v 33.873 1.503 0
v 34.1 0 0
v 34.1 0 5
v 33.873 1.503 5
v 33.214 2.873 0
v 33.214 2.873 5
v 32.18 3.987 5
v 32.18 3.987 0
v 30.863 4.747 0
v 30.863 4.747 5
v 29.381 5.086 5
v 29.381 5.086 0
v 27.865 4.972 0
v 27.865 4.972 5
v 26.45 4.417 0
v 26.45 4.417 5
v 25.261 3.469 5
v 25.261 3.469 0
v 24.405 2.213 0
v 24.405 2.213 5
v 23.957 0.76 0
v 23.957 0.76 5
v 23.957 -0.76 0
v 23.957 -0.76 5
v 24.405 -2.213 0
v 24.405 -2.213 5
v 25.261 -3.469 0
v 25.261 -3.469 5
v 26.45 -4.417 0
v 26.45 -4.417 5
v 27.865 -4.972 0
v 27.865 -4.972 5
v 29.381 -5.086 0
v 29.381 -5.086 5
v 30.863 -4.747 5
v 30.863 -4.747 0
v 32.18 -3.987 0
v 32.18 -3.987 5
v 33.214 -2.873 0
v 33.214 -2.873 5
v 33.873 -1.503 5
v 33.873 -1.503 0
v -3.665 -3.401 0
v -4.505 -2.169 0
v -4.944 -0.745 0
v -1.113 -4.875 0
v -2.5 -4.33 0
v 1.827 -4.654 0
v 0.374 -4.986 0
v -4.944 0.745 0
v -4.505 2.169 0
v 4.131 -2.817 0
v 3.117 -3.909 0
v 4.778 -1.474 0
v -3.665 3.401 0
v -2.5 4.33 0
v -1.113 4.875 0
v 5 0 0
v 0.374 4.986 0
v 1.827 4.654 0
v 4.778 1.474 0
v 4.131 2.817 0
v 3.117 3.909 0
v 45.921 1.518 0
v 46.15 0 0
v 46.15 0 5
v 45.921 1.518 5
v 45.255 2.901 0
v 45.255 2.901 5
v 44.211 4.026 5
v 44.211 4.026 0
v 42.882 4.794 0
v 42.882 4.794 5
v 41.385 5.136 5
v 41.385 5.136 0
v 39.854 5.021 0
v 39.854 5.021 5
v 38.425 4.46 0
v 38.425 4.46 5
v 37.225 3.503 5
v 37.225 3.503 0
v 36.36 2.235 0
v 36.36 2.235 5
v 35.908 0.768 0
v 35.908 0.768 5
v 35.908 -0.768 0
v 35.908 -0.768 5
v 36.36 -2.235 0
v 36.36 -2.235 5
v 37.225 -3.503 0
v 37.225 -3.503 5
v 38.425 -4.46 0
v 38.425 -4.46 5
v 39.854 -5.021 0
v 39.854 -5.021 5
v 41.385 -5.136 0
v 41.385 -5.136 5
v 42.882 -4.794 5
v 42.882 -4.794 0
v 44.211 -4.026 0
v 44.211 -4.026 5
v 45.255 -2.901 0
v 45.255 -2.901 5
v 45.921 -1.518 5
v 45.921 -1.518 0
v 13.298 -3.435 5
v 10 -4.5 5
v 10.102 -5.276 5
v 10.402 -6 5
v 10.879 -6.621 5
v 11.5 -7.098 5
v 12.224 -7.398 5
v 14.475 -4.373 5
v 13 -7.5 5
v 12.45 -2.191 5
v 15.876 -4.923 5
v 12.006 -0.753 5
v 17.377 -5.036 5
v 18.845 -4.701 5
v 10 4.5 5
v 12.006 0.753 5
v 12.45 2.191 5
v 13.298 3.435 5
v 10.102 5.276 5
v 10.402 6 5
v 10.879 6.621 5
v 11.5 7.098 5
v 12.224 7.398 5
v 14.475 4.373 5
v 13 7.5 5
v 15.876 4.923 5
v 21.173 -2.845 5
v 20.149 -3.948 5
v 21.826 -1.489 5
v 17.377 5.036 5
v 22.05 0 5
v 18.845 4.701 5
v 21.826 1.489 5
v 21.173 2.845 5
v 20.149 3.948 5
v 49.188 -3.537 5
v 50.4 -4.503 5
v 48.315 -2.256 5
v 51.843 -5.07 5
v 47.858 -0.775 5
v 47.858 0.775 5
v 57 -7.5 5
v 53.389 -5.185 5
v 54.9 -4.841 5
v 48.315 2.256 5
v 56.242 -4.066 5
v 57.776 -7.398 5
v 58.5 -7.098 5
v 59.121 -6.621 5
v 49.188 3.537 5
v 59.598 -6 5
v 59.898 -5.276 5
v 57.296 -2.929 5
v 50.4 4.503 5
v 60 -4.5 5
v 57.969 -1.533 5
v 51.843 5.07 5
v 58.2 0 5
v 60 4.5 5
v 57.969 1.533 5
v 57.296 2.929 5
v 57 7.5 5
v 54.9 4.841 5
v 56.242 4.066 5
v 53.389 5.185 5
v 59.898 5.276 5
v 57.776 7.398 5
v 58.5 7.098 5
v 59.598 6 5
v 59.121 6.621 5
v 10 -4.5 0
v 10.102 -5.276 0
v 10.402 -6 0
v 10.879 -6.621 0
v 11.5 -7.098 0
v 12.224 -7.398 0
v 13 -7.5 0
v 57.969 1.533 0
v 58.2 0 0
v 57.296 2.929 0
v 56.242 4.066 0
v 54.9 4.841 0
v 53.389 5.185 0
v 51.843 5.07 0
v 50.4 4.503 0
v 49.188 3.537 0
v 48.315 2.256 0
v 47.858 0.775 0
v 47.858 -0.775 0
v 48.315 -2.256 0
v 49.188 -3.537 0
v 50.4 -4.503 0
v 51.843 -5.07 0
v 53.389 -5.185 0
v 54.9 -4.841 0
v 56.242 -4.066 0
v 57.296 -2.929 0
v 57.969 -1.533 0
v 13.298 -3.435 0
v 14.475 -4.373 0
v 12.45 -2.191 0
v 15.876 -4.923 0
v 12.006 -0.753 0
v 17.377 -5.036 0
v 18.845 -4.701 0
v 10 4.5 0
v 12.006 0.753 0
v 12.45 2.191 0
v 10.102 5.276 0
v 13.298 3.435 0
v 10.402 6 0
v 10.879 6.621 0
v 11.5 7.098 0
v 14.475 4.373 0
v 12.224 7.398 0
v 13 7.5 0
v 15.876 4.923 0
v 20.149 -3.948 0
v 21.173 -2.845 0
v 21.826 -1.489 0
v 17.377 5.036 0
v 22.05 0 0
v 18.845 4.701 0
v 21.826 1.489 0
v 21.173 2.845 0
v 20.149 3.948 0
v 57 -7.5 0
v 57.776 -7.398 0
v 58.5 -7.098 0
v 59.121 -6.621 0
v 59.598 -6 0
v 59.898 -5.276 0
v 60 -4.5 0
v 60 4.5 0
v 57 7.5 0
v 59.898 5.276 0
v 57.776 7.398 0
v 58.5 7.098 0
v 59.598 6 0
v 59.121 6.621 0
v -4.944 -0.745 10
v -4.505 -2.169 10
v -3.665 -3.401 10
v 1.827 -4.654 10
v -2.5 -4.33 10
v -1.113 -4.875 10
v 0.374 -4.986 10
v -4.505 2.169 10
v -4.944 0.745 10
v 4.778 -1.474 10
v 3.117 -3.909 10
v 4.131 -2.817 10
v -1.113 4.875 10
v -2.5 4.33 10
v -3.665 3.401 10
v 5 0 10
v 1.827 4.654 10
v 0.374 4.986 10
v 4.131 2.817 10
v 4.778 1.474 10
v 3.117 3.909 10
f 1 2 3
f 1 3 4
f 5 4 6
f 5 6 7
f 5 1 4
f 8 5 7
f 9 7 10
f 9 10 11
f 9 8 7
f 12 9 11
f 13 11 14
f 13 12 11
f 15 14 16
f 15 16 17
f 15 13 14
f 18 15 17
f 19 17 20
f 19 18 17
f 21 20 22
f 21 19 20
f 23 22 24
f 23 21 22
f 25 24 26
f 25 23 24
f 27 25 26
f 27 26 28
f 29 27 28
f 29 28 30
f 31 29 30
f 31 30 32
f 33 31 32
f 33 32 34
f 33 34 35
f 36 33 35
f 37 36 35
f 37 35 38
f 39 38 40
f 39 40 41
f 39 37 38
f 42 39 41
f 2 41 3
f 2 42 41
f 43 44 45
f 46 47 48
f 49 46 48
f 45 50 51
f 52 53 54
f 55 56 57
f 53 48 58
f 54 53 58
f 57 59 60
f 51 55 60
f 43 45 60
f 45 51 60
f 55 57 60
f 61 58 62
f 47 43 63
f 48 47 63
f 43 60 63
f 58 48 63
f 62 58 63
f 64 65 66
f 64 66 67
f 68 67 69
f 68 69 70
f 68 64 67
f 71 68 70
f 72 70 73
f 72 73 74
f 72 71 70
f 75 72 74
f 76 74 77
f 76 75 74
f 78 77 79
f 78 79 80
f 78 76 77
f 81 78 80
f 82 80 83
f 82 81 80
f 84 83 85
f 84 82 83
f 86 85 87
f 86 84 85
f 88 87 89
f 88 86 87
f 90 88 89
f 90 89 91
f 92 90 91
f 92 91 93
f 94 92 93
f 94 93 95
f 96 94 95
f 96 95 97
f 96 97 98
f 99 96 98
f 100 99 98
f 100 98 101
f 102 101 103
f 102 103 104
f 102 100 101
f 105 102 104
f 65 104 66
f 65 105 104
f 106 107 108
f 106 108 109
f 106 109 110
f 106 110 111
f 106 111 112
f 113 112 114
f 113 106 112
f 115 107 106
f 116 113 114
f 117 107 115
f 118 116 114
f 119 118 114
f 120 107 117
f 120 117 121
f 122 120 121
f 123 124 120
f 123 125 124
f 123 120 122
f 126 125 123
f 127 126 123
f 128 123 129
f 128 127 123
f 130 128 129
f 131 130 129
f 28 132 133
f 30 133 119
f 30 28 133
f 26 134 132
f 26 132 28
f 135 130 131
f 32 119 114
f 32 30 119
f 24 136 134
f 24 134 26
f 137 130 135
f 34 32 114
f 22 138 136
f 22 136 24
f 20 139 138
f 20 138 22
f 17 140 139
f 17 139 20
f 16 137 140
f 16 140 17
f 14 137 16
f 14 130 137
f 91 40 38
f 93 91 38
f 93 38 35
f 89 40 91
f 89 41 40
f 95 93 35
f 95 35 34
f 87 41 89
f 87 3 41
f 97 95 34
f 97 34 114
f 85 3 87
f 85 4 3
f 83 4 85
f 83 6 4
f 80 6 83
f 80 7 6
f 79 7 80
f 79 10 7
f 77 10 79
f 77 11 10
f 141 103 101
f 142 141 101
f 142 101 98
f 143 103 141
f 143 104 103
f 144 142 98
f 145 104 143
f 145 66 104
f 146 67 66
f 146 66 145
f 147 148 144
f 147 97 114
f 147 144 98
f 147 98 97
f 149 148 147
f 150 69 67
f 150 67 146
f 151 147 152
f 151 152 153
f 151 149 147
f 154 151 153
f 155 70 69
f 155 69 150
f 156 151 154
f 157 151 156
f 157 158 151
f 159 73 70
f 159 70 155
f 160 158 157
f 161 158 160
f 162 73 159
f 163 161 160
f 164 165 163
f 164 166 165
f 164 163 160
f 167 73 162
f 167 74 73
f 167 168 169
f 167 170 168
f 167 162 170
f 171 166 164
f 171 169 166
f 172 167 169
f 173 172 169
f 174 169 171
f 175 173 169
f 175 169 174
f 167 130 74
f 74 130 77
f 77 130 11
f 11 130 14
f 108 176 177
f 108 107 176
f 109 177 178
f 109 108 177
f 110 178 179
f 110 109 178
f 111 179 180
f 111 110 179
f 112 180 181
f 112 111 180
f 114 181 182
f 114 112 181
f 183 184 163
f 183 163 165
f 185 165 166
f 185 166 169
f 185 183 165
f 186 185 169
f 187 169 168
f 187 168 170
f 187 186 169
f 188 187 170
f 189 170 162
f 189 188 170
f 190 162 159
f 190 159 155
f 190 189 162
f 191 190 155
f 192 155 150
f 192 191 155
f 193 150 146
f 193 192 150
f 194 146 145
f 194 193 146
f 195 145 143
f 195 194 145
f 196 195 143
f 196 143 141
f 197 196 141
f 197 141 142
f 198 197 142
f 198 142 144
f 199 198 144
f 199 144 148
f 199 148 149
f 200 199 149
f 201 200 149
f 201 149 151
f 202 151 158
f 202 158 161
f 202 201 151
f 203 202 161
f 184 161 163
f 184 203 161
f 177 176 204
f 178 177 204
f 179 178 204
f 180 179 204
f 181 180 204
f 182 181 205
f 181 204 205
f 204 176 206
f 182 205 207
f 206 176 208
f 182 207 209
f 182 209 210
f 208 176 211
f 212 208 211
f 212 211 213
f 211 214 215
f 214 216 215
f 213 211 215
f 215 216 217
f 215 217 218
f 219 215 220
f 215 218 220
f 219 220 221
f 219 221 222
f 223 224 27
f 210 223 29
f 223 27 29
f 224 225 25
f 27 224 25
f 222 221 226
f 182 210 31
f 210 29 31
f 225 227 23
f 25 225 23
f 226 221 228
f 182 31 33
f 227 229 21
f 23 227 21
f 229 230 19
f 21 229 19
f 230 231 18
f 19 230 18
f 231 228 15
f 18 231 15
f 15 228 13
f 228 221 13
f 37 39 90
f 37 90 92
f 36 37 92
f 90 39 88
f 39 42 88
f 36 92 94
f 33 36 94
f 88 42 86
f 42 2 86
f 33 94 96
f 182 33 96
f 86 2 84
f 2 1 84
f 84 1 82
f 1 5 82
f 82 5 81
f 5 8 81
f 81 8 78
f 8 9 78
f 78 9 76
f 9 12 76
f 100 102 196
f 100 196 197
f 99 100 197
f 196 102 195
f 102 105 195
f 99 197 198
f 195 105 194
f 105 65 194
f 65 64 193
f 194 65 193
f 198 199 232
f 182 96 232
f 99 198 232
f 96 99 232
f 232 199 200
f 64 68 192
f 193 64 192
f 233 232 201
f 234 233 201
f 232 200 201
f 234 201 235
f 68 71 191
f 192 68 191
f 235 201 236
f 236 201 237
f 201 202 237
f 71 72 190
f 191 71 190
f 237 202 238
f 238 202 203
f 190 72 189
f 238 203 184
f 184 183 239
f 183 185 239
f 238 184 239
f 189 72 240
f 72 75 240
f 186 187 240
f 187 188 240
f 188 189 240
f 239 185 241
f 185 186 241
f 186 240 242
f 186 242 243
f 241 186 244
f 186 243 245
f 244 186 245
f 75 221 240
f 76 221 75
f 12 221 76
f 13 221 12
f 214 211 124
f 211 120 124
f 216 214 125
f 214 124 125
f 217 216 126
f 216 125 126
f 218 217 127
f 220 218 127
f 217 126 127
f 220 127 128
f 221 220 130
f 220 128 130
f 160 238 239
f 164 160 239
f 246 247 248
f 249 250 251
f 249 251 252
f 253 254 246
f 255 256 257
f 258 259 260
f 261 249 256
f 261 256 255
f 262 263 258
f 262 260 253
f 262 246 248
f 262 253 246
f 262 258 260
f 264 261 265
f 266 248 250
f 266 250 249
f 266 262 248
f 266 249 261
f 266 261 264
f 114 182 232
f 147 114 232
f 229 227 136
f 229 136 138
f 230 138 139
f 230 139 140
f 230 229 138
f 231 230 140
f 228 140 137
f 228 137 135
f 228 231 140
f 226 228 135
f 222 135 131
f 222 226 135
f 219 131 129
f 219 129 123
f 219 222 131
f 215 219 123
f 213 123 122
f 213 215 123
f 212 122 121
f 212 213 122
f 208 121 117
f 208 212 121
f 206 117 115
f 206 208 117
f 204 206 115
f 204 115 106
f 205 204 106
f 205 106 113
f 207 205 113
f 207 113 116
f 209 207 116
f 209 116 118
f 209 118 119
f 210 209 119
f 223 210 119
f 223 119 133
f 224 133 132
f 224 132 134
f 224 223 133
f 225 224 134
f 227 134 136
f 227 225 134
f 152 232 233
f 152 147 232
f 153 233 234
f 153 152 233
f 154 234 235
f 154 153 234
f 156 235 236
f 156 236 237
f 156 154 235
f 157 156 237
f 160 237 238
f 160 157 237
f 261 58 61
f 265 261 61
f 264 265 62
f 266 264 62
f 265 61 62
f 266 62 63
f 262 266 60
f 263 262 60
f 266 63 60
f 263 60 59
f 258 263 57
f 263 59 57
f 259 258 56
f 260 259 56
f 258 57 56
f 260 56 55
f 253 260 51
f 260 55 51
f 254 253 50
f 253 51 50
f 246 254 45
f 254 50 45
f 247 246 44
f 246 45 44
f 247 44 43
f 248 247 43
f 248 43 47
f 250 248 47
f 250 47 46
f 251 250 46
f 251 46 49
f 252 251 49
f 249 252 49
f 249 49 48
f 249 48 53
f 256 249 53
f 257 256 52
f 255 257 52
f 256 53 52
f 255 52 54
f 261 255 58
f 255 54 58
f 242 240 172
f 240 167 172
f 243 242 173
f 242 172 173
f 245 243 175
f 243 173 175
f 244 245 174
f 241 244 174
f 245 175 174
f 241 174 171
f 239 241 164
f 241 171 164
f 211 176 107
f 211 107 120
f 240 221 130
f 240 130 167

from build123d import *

# Parameters (mm, degrees)
F0_W     = 50
F0_H     = 15
F0_R     = 5.05
F0_R_2   = 5.1
F0_R_3   = 5.15
F0_R_4   = 5.2
F1_DEPTH = 5
F0_R_5   = 5
F2_DEPTH = 10
F3_R     = 3


with BuildPart() as f1:
    # F0 (on Top) → F1 (new body)
    with BuildSketch(Plane.XY):
        with Locations((35, 0)):
            Rectangle(F0_W, F0_H)
        with Locations((17, 0)):
            Circle(F0_R, mode=Mode.SUBTRACT)
        with Locations((29, 0)):
            Circle(F0_R_2, mode=Mode.SUBTRACT)
        with Locations((41, 0)):
            Circle(F0_R_3, mode=Mode.SUBTRACT)
        with Locations((53, 0)):
            Circle(F0_R_4, mode=Mode.SUBTRACT)
    extrude(amount=F1_DEPTH)

    # F3
    f3_edges = [f1.edges().sort_by_distance(p)[0] for p in [
        (10, -7.5, 2.5),
        (60, -7.5, 2.5),
        (60, 7.5, 2.5),
        (10, 7.5, 2.5),
    ]]
    fillet(f3_edges, radius=F3_R)


with BuildPart() as f2:
    # F0 (on Top) → F2 (new body)
    with BuildSketch(Plane.XY):
        Circle(F0_R_5)
    extrude(amount=F2_DEPTH)


solid = Compound([f1.part, f2.part])
